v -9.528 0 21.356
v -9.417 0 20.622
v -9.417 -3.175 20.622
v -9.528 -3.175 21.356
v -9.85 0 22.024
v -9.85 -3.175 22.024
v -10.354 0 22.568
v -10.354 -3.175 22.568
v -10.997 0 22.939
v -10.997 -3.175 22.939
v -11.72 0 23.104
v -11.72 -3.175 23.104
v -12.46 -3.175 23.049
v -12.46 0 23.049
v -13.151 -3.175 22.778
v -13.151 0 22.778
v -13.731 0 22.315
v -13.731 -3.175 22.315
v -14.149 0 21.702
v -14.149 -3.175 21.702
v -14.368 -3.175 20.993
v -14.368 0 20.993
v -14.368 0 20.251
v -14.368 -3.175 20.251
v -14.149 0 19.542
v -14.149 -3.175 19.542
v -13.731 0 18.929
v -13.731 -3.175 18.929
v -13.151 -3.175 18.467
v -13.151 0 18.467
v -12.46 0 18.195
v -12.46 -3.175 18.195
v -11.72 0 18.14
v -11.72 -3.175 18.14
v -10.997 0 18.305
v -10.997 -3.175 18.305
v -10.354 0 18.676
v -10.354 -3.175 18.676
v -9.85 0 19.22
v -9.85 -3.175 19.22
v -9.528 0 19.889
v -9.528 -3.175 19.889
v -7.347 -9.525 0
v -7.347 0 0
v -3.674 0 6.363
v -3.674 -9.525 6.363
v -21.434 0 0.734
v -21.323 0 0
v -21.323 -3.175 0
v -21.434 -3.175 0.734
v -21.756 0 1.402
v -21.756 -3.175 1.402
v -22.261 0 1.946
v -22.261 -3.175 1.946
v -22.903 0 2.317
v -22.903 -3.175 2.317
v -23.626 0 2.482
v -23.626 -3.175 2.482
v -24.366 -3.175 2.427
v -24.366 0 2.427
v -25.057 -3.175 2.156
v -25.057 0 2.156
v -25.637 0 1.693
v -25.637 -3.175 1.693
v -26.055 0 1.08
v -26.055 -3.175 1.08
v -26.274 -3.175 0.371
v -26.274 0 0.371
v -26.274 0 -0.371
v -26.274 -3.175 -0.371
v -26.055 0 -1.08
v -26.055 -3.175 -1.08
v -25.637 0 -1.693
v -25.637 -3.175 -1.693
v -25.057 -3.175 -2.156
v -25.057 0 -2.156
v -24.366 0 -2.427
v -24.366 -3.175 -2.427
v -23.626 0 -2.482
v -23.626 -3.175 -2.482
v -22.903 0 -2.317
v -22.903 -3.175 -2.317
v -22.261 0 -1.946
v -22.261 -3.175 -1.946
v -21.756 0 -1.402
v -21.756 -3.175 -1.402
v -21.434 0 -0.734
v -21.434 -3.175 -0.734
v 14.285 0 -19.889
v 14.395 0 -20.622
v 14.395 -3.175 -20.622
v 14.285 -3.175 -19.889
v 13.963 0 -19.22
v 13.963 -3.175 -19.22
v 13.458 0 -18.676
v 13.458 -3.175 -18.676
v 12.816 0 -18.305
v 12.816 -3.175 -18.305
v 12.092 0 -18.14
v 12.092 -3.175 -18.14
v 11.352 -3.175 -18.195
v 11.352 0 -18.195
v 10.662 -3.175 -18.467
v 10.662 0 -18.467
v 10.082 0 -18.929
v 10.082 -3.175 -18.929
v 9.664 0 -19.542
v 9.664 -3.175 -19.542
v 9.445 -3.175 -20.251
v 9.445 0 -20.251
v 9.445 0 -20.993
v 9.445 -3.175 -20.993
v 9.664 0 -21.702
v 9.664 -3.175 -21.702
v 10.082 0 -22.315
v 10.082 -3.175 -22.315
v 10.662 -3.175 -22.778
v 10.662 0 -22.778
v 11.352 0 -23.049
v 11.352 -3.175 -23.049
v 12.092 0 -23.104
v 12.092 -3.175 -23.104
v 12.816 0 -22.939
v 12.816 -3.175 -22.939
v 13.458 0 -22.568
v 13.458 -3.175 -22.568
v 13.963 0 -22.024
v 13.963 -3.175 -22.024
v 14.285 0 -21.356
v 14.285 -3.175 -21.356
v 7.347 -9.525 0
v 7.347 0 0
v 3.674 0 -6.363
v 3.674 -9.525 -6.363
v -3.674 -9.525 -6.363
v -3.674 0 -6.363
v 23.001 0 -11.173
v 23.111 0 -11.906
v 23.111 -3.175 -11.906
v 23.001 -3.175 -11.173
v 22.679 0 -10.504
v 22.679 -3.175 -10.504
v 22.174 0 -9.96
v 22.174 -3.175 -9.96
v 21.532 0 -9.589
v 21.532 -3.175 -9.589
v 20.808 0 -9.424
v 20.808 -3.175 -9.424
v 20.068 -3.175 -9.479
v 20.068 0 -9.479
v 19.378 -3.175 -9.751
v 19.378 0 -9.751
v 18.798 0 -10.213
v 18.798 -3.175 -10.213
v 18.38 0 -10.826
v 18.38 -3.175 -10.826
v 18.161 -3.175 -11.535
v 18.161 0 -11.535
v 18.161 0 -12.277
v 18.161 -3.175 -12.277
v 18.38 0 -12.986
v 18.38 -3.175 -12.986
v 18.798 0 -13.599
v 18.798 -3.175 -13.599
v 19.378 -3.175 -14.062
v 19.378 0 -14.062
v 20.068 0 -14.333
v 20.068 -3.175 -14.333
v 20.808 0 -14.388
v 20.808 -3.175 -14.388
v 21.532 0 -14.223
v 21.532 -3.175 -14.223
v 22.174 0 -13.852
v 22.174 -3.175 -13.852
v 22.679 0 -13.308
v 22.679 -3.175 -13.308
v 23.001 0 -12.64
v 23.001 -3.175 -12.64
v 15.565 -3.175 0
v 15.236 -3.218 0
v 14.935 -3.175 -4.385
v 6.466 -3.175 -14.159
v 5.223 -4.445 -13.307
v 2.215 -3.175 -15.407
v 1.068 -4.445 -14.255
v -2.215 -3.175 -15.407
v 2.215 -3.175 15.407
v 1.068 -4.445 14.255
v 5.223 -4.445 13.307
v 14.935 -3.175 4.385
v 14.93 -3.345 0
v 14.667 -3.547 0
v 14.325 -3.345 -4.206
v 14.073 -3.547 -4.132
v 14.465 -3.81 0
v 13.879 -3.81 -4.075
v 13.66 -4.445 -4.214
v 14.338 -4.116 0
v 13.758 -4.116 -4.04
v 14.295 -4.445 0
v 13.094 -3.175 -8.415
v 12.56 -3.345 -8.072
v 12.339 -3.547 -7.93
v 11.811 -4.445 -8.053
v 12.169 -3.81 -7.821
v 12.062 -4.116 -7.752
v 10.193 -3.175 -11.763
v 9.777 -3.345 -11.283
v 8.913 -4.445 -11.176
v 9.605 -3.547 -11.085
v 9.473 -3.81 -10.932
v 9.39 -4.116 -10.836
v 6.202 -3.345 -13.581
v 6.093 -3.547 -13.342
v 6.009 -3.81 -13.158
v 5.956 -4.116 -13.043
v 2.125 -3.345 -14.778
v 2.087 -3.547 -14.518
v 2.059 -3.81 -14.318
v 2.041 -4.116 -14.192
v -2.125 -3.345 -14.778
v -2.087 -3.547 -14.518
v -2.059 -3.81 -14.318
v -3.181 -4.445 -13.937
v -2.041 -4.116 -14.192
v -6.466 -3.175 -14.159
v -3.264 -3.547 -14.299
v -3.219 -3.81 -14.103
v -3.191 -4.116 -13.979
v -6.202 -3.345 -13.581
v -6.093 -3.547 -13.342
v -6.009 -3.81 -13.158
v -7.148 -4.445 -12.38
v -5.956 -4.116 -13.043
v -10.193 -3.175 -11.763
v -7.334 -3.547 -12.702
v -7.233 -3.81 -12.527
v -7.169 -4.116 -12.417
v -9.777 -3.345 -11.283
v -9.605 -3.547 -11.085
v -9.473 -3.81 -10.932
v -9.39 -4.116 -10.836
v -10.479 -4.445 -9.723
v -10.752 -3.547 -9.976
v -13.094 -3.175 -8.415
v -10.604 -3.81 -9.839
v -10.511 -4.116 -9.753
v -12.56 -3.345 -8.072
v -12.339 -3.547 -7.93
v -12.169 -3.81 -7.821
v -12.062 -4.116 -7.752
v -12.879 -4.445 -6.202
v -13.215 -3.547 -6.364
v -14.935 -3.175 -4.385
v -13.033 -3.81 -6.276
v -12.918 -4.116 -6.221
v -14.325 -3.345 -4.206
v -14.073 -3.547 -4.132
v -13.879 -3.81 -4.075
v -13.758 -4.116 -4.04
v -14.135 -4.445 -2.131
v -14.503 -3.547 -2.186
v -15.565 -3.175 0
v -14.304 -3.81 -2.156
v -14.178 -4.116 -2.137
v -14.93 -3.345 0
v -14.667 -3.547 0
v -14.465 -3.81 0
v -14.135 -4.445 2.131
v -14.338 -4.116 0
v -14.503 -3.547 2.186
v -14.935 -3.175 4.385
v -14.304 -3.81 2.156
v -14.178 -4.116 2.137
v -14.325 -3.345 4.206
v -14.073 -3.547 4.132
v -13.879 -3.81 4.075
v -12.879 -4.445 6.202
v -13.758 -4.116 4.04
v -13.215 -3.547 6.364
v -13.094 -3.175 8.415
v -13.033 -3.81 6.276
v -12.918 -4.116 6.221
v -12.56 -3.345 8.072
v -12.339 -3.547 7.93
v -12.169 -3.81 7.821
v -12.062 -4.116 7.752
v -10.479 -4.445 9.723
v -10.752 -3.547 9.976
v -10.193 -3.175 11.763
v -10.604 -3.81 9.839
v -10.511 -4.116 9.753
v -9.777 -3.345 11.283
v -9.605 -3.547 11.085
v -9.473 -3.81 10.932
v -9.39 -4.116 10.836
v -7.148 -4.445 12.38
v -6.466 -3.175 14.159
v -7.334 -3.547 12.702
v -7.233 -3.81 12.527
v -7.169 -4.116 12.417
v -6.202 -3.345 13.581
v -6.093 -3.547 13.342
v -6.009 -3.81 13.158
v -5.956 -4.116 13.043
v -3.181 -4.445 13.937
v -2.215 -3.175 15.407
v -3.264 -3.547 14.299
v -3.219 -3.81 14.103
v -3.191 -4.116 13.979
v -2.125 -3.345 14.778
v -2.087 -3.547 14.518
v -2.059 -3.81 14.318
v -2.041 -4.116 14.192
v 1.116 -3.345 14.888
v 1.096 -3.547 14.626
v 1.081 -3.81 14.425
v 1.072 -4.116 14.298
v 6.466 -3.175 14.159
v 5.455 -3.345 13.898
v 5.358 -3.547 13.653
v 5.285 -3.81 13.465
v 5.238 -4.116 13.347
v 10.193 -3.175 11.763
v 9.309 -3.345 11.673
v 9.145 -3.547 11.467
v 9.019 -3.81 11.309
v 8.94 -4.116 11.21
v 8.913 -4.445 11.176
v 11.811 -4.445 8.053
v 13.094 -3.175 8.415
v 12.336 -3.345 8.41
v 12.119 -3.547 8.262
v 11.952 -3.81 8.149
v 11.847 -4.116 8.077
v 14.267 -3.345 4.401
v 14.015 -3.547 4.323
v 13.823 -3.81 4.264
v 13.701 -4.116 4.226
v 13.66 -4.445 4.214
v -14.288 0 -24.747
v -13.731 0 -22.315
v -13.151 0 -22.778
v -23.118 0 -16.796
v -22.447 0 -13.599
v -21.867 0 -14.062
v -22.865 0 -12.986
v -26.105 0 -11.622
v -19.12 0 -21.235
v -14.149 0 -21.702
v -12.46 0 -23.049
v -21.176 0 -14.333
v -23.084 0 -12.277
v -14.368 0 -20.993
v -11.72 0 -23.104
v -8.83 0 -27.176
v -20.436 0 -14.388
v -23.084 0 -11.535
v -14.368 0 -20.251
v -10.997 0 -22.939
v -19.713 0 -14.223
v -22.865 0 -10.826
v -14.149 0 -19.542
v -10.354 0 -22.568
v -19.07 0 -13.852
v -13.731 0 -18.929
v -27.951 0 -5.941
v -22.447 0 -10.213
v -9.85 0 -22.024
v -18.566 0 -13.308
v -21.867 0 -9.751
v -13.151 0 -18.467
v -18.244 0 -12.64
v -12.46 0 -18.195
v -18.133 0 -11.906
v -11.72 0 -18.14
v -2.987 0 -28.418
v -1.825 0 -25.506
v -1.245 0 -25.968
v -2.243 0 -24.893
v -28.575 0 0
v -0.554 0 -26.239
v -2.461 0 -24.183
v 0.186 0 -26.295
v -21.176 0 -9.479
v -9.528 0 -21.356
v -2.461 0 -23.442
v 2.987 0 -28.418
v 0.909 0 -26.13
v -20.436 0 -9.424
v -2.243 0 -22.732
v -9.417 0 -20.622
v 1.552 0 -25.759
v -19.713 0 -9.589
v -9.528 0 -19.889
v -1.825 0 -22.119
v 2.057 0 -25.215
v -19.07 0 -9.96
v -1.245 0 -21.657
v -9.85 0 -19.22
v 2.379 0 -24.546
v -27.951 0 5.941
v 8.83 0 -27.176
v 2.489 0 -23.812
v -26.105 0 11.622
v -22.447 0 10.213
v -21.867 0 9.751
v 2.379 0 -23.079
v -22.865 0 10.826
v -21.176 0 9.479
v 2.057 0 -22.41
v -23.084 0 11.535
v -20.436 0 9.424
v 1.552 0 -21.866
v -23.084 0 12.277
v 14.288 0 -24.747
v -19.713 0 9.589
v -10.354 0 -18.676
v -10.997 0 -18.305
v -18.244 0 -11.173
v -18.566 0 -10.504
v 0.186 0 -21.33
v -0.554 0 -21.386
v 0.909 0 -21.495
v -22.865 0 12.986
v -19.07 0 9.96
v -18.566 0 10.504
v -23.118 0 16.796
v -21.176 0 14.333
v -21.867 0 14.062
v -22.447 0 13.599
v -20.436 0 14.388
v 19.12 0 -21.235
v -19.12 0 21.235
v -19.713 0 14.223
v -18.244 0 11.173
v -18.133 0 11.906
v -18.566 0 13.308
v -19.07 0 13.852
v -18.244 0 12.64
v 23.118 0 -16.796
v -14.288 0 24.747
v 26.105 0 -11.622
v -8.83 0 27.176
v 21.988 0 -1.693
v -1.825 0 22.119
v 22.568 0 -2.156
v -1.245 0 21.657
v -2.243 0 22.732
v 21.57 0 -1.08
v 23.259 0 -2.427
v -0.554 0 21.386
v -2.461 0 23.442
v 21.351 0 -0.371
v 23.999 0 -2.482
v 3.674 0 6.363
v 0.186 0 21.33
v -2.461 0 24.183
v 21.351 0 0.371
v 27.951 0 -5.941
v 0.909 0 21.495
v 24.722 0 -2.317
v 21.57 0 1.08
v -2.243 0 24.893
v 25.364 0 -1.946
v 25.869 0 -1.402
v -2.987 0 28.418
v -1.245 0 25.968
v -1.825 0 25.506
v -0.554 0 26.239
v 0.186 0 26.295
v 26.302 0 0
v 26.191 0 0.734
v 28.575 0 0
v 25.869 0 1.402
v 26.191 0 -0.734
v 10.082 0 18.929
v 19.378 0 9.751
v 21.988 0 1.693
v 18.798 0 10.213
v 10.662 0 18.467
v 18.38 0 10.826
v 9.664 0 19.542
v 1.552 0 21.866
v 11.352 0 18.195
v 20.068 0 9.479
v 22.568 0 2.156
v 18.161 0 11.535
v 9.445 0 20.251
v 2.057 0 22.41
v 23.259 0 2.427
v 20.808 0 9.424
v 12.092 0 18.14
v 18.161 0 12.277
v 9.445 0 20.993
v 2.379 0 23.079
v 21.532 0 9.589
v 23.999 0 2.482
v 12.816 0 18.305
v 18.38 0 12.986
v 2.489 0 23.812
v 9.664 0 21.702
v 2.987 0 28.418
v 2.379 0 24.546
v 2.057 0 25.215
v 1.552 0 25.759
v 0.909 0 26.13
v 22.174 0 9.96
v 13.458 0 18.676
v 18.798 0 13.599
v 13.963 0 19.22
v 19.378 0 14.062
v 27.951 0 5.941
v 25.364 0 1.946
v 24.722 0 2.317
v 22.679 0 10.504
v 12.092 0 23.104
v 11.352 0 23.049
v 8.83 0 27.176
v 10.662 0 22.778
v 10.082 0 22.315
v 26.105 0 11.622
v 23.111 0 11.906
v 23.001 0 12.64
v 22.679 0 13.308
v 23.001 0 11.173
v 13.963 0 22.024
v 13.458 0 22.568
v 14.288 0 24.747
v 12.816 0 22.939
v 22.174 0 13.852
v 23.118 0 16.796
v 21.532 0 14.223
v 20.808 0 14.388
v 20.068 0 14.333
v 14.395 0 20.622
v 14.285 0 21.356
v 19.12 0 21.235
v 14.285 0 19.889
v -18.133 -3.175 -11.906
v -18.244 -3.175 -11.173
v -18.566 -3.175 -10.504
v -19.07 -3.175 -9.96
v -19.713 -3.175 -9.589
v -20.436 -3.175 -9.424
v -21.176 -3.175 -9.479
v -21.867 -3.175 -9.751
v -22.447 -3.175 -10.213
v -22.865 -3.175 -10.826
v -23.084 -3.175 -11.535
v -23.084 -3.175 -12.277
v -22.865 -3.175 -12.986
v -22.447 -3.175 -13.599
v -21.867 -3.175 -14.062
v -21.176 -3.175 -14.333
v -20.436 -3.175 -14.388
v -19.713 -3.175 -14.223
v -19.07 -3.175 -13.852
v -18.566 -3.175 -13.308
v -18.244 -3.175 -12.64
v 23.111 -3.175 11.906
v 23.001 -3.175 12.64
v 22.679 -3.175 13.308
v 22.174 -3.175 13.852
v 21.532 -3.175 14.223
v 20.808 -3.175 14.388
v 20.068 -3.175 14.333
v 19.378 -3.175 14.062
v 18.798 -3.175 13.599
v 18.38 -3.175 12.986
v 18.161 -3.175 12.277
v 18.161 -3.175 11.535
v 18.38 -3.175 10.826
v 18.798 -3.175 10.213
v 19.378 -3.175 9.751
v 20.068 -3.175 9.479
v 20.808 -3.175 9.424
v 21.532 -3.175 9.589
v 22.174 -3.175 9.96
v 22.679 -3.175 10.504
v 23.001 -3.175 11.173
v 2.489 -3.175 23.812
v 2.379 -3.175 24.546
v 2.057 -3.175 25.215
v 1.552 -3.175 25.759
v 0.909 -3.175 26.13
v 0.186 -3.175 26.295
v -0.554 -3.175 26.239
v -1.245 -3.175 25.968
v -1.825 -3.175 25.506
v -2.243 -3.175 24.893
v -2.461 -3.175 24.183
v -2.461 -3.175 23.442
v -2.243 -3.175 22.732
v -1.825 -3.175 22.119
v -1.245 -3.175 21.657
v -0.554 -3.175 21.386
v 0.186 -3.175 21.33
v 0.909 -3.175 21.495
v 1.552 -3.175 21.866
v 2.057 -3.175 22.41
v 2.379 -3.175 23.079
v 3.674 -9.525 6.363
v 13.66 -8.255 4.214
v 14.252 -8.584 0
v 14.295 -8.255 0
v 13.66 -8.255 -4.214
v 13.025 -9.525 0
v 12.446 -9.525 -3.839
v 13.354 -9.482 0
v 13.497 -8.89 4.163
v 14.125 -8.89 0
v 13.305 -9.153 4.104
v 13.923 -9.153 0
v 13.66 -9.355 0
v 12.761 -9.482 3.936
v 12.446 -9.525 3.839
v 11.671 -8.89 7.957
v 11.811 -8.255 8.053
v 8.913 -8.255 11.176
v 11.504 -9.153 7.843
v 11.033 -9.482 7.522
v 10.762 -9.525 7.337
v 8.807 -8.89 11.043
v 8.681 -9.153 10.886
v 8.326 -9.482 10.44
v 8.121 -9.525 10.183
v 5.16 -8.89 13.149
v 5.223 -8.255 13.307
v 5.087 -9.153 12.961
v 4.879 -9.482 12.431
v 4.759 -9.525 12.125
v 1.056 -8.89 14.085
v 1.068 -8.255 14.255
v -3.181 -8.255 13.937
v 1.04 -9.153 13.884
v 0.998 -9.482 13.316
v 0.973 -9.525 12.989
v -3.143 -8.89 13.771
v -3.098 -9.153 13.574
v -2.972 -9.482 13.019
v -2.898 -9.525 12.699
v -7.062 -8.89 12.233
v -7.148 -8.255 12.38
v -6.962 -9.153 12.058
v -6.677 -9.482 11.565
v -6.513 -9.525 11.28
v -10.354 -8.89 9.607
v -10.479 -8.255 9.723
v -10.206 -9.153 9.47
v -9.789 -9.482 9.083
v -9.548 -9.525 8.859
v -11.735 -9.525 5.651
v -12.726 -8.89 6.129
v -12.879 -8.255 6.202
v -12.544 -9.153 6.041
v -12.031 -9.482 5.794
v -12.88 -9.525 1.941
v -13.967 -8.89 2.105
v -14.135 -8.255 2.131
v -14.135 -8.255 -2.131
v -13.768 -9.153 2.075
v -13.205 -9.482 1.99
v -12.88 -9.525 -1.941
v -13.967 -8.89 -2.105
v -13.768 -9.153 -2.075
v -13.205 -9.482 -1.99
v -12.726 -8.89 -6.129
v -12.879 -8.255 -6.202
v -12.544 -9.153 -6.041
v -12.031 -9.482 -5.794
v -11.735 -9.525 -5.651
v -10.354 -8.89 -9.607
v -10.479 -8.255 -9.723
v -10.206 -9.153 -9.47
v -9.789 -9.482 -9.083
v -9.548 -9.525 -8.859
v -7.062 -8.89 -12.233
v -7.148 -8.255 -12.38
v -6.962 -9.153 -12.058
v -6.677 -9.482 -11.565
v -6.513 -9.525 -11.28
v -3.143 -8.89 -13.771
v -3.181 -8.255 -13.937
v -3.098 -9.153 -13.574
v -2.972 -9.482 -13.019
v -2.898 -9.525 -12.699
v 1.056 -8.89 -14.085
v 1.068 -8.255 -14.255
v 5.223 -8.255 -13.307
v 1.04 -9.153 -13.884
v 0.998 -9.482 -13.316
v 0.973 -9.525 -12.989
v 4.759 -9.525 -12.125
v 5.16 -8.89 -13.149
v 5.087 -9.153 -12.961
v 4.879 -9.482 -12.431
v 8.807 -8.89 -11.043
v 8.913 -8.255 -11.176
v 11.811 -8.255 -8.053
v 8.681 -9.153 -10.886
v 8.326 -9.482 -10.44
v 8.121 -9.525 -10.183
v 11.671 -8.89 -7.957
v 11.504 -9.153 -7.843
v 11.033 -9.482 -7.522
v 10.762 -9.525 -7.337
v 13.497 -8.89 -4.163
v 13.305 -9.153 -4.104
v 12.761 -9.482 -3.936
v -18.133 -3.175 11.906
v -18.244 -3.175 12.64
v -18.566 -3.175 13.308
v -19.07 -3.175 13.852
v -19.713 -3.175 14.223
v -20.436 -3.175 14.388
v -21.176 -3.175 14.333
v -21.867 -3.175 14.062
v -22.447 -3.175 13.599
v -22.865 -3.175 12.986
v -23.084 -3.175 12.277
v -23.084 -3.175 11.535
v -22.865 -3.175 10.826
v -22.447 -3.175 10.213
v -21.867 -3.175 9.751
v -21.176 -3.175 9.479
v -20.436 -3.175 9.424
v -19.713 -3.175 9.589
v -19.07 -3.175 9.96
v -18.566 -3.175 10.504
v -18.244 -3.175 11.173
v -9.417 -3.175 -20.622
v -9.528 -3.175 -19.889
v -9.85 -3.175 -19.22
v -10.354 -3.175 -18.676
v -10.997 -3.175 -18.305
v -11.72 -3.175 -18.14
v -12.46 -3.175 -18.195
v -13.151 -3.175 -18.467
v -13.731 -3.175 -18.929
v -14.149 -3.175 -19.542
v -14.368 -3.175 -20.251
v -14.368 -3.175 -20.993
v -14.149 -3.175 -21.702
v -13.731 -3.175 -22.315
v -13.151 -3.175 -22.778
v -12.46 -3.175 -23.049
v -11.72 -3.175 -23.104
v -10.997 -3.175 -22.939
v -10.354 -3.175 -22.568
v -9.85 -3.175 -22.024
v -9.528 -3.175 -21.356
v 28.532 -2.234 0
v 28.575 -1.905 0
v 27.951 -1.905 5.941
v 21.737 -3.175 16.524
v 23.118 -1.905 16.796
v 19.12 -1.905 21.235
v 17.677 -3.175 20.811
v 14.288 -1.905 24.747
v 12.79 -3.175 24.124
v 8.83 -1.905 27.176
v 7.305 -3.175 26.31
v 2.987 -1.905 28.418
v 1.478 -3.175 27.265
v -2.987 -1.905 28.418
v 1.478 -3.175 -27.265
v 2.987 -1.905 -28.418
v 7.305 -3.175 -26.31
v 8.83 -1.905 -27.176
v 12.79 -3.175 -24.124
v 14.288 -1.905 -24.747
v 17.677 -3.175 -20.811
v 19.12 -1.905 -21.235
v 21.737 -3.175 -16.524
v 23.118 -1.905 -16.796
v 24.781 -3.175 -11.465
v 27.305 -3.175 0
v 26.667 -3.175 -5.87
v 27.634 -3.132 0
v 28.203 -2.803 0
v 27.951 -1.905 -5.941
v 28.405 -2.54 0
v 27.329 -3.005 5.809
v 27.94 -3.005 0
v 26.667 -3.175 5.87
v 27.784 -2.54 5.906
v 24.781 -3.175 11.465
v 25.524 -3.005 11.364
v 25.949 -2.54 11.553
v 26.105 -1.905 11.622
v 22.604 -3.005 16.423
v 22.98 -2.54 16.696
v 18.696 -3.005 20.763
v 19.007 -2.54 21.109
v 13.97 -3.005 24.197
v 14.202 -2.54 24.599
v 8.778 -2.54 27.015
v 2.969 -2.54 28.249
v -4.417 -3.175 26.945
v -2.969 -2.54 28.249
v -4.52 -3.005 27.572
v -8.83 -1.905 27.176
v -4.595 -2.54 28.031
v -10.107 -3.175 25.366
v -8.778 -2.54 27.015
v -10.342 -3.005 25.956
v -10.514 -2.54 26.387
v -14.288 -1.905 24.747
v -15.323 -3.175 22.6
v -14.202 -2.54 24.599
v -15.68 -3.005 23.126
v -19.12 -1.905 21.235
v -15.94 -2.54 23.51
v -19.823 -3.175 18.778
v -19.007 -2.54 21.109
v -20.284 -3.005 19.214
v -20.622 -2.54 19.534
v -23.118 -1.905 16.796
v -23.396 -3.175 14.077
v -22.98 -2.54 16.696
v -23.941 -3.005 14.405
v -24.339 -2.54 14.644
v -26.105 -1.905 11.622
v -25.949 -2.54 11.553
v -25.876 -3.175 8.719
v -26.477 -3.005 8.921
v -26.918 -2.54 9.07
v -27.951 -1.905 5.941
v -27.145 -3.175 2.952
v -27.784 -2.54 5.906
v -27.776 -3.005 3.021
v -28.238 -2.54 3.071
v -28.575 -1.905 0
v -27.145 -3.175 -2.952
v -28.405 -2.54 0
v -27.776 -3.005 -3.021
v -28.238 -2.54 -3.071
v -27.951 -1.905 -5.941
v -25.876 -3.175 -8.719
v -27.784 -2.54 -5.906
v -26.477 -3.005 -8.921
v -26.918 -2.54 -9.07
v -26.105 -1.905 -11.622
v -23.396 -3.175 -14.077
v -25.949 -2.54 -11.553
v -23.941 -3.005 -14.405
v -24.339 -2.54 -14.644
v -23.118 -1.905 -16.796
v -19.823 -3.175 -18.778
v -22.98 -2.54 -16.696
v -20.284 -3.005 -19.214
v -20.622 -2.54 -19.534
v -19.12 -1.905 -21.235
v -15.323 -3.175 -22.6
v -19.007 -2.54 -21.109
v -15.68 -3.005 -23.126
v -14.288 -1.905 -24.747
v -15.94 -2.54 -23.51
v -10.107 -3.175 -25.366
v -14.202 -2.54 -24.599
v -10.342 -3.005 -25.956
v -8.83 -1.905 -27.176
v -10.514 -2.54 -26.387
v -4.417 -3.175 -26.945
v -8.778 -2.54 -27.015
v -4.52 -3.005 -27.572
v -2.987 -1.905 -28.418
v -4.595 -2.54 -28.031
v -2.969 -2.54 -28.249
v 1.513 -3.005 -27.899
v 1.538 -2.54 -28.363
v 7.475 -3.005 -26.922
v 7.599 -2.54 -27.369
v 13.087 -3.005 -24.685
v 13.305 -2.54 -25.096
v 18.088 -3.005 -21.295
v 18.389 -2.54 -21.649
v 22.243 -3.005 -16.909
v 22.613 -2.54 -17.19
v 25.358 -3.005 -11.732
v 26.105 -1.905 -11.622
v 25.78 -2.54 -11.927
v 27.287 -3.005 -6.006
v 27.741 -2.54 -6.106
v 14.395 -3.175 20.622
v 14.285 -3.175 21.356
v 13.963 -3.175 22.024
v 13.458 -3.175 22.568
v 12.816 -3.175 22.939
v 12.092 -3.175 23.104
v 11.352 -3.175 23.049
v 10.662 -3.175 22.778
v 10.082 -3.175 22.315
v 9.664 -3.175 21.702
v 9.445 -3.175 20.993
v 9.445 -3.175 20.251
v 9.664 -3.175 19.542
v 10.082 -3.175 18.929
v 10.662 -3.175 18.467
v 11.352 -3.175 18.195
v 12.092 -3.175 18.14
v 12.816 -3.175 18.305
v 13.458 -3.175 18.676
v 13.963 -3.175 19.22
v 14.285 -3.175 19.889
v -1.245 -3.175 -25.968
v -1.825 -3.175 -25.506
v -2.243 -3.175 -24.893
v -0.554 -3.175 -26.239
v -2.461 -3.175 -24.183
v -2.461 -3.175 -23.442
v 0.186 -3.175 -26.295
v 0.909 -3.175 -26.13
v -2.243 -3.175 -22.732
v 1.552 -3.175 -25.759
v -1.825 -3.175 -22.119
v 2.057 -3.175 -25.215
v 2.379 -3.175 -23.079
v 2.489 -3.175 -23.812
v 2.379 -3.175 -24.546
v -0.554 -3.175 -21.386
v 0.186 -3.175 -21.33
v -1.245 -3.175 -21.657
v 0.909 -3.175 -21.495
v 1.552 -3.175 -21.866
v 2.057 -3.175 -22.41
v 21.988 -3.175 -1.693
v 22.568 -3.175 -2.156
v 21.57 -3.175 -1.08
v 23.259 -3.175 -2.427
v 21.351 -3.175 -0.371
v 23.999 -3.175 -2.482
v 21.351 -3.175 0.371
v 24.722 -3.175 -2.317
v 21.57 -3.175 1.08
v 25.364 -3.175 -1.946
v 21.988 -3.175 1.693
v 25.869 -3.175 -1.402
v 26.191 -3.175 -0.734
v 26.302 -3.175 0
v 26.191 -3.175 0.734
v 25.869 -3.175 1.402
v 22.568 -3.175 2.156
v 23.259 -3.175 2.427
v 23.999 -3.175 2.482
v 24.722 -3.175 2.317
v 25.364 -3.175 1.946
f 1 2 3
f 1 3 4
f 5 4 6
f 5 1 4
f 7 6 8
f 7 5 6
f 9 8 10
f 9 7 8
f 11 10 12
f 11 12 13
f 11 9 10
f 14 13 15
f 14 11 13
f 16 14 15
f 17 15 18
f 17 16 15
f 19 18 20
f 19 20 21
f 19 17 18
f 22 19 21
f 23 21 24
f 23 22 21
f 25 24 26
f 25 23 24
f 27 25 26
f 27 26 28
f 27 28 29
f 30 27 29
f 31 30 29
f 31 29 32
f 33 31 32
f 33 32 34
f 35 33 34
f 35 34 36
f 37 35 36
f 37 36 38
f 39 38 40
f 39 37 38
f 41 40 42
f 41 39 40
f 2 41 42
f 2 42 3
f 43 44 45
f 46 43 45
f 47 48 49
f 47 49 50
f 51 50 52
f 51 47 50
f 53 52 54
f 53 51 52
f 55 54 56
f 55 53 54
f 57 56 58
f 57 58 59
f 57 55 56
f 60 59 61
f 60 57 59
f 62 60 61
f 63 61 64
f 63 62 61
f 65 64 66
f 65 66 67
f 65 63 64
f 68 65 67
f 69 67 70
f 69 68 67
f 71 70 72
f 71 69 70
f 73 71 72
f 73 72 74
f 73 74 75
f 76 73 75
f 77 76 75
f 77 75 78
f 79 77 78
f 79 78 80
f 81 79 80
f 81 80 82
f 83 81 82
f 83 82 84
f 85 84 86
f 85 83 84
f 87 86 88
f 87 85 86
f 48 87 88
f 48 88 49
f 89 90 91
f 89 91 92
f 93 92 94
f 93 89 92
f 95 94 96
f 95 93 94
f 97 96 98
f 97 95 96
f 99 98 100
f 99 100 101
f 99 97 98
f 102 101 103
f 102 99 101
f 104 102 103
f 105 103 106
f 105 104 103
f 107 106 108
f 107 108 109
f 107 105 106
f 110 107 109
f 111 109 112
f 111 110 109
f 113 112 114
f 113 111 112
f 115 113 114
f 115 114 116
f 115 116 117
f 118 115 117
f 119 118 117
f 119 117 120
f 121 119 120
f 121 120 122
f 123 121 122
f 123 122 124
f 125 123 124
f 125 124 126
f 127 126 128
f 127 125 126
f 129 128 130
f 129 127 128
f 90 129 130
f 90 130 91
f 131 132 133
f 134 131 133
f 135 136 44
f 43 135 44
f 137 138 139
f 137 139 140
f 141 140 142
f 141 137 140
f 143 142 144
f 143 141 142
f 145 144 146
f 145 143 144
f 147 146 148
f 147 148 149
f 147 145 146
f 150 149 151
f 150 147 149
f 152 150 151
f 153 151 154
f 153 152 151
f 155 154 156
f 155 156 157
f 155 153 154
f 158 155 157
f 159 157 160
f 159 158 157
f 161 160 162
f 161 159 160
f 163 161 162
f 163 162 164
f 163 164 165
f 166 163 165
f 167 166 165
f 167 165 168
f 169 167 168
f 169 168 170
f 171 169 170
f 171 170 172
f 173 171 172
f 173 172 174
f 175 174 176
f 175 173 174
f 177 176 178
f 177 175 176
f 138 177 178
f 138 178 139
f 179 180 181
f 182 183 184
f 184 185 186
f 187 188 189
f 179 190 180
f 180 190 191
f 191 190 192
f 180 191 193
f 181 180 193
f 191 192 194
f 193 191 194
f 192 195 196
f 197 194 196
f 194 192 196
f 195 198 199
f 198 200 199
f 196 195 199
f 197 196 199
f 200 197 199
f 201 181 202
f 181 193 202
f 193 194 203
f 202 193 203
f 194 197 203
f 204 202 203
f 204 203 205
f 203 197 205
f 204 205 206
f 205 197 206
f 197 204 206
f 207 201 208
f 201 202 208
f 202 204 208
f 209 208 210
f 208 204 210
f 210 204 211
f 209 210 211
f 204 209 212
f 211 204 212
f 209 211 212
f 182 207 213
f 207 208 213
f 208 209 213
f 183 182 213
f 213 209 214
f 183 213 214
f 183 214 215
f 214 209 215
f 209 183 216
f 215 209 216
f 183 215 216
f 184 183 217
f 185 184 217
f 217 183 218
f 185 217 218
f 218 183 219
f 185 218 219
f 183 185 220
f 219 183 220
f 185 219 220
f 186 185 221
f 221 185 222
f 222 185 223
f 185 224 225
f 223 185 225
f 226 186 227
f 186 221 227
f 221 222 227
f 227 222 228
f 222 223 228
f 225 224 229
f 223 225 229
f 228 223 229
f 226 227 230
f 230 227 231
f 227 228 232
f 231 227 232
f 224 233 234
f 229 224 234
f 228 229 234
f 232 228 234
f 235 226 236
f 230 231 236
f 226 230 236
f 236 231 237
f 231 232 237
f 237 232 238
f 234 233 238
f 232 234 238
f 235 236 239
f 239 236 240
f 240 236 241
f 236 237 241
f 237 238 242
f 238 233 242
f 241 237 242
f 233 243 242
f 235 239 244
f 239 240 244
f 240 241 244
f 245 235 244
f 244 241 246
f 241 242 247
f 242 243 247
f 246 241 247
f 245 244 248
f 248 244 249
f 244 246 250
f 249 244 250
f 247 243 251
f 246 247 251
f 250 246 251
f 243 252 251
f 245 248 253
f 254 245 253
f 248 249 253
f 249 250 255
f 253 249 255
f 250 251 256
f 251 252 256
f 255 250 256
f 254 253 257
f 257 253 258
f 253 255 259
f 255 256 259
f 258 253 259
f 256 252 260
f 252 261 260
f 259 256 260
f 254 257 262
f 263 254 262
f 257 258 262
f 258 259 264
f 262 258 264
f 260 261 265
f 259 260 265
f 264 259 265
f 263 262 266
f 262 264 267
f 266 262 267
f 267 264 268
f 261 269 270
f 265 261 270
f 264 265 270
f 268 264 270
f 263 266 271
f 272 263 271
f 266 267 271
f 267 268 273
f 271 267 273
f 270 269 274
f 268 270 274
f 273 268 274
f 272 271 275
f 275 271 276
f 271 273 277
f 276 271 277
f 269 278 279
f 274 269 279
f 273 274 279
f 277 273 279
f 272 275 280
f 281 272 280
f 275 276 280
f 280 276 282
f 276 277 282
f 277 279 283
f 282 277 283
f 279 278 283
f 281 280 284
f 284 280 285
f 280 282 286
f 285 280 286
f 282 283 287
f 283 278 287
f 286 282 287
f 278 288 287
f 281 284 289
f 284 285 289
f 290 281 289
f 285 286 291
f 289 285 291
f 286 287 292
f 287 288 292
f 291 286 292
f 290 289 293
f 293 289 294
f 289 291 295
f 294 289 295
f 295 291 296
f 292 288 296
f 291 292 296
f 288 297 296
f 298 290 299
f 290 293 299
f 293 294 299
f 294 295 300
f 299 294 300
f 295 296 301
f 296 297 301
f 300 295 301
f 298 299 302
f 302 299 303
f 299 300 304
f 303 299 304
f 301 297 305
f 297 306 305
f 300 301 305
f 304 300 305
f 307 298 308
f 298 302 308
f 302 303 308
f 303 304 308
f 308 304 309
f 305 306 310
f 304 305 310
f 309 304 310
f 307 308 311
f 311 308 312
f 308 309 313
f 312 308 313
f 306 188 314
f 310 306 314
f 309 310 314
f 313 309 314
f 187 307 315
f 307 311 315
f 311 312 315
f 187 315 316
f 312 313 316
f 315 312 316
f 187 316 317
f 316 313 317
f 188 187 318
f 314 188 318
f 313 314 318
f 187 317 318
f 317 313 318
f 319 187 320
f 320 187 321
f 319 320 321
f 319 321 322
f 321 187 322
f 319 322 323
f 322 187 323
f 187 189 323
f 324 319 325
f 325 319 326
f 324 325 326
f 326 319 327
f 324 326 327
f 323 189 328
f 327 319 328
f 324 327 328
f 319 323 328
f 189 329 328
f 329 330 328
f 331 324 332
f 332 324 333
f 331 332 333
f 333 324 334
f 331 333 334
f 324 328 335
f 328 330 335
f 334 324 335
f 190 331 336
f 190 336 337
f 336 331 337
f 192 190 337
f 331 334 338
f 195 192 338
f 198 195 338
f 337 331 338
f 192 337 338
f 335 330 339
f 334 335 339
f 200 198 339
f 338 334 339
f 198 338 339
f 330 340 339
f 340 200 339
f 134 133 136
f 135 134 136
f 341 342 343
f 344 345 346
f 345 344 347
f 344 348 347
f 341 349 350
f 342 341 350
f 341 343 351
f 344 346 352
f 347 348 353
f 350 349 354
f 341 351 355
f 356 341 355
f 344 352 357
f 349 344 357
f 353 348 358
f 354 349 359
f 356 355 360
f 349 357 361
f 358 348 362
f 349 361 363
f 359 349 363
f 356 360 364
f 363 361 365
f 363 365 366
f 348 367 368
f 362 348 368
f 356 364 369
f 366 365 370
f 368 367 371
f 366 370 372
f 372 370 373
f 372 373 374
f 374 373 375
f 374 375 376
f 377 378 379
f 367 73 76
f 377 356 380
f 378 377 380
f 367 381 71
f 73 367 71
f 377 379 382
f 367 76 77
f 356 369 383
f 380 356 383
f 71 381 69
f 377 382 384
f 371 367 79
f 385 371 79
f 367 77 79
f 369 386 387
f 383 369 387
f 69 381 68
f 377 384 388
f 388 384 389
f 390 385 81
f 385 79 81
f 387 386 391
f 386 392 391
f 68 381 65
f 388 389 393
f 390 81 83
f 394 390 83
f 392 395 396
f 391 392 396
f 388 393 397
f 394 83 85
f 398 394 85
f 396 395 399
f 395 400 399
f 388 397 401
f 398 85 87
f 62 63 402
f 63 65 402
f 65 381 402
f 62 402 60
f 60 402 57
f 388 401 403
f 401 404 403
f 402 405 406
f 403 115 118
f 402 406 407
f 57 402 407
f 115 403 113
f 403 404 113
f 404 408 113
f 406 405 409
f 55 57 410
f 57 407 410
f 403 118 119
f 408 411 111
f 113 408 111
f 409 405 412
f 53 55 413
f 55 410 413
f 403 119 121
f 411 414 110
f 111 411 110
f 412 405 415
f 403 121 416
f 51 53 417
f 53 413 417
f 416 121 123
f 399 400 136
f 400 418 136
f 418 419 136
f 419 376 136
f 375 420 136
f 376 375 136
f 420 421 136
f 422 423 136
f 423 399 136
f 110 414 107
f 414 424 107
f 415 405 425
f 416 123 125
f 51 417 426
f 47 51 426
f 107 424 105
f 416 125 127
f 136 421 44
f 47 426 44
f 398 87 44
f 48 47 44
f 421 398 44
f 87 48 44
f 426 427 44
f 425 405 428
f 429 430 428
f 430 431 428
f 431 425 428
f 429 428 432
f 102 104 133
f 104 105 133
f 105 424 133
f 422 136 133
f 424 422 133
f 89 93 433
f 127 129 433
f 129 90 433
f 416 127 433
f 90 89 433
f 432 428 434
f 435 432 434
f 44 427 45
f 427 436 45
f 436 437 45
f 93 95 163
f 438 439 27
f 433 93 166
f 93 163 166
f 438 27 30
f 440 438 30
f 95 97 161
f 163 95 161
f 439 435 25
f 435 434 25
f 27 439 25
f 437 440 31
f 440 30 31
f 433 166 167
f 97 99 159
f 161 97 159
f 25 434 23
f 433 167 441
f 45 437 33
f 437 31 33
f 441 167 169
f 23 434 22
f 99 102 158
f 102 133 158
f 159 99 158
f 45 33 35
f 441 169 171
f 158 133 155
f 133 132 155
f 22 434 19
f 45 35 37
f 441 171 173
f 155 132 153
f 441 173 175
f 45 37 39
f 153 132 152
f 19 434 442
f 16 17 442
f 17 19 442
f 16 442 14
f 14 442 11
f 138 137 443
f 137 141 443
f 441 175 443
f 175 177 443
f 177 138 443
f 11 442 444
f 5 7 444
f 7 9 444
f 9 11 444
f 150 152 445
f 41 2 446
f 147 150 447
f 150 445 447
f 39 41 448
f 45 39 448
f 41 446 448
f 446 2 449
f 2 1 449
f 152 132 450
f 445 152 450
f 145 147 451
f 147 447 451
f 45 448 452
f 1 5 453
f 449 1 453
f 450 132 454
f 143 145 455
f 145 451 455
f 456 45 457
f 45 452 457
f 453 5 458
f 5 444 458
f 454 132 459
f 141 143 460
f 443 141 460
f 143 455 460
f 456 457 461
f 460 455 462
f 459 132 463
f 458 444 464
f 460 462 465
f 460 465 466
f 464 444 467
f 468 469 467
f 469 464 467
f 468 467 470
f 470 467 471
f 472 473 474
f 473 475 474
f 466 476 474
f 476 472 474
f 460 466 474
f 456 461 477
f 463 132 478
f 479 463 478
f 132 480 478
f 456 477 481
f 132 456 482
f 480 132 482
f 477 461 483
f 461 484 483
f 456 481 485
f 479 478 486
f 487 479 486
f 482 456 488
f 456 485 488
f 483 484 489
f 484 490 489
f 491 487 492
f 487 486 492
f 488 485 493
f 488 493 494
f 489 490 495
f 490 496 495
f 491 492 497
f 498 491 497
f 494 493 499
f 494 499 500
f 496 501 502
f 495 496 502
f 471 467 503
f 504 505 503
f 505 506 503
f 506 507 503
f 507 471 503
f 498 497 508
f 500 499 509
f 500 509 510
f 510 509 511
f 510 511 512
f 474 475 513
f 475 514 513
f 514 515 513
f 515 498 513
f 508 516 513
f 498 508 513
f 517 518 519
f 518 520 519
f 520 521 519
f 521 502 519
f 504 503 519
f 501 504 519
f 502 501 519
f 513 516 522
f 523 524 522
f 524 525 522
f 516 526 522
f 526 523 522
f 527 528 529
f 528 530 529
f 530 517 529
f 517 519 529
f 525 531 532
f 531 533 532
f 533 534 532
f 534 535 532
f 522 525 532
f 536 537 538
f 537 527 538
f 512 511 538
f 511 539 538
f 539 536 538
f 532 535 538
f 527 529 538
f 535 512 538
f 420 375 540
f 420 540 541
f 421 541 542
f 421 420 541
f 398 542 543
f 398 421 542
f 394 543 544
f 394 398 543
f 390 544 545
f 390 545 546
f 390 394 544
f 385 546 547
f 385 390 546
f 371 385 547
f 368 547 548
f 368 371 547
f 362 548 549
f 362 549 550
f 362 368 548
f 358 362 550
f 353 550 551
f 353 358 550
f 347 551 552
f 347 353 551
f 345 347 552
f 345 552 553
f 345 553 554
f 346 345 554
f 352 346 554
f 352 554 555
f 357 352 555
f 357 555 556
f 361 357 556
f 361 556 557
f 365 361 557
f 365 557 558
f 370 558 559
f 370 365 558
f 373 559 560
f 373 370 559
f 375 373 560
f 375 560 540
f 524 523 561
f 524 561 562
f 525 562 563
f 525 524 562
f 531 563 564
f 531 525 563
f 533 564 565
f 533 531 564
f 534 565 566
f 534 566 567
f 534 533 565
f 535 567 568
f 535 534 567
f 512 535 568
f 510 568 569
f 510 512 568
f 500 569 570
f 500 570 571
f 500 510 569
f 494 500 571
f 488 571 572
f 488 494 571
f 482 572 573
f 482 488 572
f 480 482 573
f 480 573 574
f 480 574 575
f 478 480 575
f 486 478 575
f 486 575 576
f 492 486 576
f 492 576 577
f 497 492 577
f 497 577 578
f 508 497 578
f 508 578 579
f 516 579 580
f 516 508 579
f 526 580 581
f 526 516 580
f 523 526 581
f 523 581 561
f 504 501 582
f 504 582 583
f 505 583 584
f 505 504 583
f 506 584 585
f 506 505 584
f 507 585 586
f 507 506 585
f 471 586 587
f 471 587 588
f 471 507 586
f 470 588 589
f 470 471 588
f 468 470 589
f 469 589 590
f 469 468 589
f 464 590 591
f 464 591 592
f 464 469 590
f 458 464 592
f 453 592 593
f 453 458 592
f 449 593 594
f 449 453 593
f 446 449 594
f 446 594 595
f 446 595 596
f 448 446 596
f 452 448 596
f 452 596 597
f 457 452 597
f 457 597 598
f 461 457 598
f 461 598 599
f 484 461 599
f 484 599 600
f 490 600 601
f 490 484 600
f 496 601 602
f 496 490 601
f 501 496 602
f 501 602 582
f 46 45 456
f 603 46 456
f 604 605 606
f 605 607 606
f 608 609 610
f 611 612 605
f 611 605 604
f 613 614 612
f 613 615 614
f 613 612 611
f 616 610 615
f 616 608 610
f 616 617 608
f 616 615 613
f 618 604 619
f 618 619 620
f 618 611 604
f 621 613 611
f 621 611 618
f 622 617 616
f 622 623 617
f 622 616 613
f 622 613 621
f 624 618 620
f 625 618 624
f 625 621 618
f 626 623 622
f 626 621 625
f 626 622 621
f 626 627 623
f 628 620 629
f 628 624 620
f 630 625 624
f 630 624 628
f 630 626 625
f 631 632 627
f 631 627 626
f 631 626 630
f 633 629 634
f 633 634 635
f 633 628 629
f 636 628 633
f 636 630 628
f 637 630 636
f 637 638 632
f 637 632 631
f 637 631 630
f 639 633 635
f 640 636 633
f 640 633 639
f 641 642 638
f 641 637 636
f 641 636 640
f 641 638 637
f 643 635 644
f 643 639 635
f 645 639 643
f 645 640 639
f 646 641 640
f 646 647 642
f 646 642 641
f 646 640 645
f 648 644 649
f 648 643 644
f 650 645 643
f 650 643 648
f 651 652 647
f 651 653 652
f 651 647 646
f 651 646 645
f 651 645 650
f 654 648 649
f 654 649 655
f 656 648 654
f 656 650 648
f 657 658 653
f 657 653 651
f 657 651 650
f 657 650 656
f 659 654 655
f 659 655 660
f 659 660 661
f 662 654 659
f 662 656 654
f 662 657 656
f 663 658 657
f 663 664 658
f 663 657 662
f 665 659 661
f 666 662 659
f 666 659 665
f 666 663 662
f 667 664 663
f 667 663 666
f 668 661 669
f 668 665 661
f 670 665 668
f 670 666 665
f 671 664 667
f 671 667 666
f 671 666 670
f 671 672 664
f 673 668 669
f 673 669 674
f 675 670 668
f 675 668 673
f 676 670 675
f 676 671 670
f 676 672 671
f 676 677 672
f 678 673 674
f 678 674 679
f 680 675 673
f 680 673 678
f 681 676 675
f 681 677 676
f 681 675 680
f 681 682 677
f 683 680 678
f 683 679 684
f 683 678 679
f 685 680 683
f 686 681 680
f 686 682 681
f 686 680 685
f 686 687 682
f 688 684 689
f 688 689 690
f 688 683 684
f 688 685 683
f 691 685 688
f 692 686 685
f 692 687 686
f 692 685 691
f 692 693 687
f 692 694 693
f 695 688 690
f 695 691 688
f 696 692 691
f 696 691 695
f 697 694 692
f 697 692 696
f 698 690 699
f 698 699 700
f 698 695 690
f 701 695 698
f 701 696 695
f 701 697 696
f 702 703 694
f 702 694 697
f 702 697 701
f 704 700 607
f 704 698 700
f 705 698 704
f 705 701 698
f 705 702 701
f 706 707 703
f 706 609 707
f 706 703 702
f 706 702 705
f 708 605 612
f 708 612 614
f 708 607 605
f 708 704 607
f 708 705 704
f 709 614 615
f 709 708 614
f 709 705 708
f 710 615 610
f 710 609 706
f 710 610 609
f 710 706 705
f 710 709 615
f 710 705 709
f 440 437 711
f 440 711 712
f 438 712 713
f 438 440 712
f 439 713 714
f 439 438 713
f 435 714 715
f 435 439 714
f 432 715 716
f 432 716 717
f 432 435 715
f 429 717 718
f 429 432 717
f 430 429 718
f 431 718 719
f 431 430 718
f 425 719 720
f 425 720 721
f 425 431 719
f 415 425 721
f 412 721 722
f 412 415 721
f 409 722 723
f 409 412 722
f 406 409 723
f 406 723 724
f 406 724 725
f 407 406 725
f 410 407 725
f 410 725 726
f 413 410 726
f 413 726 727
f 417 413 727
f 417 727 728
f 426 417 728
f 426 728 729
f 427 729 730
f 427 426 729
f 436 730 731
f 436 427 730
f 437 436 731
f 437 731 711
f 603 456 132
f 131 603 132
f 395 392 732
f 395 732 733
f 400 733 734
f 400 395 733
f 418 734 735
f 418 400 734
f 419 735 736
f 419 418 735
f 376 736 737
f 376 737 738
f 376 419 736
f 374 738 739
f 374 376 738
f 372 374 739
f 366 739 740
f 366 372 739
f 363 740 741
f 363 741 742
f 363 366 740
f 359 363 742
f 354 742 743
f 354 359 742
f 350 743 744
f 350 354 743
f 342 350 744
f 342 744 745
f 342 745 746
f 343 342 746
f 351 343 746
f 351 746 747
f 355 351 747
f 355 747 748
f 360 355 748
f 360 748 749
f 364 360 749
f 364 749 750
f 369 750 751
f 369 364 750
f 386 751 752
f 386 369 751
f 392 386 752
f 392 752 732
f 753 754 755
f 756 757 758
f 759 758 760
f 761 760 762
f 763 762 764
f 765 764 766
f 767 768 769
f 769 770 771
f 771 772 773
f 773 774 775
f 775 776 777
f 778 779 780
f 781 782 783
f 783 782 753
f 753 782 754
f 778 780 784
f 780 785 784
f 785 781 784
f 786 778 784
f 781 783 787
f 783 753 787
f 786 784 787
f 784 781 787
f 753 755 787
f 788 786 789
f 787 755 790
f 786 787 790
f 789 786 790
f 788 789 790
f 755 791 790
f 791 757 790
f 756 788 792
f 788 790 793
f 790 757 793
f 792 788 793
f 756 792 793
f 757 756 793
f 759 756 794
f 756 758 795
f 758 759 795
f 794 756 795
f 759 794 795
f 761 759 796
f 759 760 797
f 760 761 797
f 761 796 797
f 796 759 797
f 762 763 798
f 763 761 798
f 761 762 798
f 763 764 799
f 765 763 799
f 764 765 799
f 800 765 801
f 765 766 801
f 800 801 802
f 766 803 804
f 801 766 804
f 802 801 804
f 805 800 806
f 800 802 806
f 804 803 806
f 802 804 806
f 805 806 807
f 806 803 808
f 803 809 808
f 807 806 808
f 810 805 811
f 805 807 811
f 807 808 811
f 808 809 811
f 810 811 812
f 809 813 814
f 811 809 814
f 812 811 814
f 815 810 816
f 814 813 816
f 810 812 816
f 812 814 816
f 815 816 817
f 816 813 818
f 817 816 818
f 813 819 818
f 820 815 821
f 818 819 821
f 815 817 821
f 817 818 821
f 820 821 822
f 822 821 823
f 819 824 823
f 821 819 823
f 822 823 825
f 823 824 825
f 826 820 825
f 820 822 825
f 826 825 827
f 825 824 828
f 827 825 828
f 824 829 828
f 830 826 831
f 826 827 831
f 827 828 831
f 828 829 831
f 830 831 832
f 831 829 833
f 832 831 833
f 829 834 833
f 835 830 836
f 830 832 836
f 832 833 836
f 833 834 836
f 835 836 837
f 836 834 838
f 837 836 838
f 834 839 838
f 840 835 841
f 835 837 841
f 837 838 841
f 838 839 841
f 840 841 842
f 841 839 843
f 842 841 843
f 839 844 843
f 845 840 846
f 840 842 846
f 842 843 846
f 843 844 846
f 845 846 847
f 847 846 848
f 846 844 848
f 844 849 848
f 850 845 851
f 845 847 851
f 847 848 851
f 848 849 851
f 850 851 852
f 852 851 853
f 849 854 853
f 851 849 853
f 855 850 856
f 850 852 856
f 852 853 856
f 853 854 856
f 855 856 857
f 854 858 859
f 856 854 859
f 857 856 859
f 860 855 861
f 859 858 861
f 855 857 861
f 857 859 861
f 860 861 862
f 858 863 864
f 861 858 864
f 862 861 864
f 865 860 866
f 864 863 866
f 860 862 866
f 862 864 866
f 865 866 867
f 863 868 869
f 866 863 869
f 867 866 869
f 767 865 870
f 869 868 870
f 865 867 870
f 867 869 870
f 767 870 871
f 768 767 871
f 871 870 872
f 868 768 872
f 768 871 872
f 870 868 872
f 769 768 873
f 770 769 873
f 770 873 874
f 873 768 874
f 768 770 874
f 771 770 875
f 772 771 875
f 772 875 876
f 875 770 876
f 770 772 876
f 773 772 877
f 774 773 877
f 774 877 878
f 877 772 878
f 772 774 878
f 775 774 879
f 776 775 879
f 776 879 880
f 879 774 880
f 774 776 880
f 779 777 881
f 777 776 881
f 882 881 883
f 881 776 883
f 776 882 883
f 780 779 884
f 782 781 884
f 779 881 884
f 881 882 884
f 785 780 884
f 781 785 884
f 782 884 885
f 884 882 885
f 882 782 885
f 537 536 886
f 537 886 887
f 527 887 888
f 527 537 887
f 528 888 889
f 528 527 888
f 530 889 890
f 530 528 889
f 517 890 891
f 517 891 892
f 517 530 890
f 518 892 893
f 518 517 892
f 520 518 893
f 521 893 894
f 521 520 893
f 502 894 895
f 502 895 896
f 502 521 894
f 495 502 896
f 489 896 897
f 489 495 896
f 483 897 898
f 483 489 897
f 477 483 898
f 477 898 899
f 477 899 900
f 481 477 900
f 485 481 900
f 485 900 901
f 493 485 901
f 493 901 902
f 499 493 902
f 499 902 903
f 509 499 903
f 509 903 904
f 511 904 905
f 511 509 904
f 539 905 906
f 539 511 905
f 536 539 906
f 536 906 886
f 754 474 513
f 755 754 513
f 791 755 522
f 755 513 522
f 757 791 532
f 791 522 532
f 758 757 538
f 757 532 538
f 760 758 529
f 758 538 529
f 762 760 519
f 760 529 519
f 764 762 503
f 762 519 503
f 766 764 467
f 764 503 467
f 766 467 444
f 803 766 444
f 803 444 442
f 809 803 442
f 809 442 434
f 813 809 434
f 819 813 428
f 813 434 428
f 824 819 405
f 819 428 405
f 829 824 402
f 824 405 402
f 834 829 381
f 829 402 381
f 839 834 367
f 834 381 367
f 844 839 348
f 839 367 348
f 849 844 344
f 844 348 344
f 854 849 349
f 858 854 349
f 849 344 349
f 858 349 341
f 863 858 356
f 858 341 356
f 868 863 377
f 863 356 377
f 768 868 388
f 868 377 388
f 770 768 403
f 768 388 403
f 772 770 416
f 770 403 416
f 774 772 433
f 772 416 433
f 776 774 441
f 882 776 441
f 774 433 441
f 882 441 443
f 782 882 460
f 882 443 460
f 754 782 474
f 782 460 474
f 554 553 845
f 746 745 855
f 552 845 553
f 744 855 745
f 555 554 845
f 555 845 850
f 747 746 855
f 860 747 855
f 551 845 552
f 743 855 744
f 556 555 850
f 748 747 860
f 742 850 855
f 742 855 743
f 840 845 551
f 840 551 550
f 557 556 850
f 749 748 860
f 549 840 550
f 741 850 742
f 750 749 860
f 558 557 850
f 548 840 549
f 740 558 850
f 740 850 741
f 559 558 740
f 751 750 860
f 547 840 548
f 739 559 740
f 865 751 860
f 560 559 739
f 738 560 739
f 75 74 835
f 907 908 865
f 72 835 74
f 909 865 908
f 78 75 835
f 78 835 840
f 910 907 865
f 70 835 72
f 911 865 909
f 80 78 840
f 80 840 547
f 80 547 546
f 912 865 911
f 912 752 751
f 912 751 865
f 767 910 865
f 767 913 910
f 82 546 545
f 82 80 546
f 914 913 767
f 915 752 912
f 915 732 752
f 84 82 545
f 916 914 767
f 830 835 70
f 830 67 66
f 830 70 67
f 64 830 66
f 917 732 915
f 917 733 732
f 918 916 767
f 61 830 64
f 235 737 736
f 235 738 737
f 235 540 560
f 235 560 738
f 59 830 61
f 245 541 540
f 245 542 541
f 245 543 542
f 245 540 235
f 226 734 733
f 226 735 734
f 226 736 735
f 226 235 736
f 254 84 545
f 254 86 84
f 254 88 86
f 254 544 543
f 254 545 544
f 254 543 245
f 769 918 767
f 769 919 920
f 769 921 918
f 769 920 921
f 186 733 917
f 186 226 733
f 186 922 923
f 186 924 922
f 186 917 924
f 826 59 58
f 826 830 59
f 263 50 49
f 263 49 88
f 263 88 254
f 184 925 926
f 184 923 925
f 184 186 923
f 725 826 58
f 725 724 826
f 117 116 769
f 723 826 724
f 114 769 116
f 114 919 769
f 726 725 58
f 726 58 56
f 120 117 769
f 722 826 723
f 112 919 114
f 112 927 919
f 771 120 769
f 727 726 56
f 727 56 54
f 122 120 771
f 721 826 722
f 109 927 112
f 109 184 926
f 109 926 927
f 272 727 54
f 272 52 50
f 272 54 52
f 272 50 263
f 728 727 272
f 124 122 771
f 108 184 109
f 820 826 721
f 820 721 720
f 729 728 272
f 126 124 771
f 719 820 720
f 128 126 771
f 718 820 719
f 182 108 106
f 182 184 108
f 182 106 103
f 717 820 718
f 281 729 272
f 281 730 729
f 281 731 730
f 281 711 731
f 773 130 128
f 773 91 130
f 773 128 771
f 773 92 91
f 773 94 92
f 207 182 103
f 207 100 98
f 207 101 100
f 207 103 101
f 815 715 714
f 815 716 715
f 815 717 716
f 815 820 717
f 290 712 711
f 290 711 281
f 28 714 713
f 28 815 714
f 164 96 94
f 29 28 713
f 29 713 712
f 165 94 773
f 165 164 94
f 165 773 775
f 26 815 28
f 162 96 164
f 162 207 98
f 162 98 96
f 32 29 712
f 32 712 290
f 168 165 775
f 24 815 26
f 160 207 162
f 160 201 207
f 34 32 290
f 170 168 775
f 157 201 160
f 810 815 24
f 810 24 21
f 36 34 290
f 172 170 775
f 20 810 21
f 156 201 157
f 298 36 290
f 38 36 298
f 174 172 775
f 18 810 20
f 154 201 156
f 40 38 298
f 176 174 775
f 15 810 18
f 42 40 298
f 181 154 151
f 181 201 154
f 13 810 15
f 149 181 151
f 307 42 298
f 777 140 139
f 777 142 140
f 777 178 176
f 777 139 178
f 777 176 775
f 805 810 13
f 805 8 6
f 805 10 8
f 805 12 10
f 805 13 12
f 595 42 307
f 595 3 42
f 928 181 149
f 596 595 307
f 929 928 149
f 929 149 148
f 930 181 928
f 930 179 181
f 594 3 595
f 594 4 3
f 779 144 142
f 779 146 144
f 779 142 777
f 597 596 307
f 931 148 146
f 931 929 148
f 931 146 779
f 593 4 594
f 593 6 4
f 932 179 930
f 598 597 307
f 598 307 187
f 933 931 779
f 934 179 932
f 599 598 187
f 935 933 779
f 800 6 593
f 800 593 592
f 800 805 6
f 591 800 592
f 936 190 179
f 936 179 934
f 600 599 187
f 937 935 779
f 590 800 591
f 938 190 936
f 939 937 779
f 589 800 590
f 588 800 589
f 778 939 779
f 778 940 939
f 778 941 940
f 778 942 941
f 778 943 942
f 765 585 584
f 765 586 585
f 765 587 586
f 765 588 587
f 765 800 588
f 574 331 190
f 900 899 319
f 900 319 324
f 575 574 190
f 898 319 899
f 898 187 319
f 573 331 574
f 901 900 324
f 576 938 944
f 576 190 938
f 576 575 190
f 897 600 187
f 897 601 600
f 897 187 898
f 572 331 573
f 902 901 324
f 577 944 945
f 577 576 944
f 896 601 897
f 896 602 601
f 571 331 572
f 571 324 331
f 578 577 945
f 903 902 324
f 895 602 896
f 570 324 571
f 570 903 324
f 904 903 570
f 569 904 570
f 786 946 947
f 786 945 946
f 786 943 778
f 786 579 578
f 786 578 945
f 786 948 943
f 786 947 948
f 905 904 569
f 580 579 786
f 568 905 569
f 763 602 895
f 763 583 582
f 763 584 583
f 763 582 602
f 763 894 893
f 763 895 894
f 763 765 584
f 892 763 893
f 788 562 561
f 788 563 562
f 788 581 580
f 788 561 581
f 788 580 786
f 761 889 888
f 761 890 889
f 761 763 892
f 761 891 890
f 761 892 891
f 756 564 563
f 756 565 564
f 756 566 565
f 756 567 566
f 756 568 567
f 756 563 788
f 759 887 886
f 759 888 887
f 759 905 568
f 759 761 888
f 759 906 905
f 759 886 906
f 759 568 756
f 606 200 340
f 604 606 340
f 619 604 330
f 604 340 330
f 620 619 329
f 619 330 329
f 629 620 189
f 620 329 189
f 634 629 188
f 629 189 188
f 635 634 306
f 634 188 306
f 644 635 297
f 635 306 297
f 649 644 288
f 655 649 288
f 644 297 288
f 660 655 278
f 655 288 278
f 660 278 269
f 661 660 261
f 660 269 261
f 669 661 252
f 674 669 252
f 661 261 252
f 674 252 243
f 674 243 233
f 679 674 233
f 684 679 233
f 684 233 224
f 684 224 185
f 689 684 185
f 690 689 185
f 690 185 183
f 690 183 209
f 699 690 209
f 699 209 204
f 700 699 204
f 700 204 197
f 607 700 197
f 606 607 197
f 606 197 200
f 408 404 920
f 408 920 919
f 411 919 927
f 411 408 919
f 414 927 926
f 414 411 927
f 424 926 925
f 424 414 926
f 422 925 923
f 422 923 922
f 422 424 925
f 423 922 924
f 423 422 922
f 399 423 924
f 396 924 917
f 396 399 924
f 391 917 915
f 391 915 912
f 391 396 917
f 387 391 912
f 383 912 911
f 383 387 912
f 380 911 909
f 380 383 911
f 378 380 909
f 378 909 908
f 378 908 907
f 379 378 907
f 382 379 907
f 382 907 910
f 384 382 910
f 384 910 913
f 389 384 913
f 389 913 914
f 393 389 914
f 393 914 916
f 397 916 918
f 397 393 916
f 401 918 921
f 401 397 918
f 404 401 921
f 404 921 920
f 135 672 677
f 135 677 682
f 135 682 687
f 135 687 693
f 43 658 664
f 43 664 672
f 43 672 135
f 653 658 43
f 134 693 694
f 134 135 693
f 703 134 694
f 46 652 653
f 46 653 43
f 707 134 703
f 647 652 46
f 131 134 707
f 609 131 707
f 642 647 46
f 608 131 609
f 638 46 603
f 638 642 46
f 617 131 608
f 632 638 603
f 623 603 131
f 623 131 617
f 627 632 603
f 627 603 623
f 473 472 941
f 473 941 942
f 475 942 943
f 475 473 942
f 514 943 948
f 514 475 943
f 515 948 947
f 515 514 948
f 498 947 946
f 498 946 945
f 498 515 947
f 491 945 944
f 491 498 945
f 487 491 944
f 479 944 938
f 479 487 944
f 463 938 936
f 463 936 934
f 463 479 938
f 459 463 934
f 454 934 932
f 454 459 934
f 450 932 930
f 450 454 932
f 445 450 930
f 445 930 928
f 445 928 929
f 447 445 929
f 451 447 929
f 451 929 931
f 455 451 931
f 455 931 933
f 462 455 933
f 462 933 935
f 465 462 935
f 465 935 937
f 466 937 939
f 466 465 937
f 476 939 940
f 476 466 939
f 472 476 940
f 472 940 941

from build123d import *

# Parameters (mm, degrees)
F0_R     = 28.575
F0_R_2   = 2.4892
F0_R_3   = 14.29512
F1_DEPTH = 3.175
F2_DEPTH = 9.525
F3_R     = 1.27


with BuildPart() as f1:
    # F0 (on Front) → F1 (new body)
    with BuildSketch(Plane.XZ):
        Circle(F0_R)
        with Locations((-11.90625, -20.62223)):
            Circle(F0_R_2, mode=Mode.SUBTRACT)
        with Locations((-20.62223, -11.90625)):
            Circle(F0_R_2, mode=Mode.SUBTRACT)
        with Locations((0, -23.8125)):
            Circle(F0_R_2, mode=Mode.SUBTRACT)
        with Locations((11.90625, -20.62223)):
            Circle(F0_R_2, mode=Mode.SUBTRACT)
        with Locations((20.62223, -11.90625)):
            Circle(F0_R_2, mode=Mode.SUBTRACT)
        with Locations((-23.8125, 0)):
            Circle(F0_R_2, mode=Mode.SUBTRACT)
        with Locations((-20.62223, 11.90625)):
            Circle(F0_R_2, mode=Mode.SUBTRACT)
        with Locations((-11.90625, 20.62223)):
            Circle(F0_R_2, mode=Mode.SUBTRACT)
        Circle(F0_R_3, mode=Mode.SUBTRACT)
        with Locations((23.8125, 0)):
            Circle(F0_R_2, mode=Mode.SUBTRACT)
        with Locations((20.62223, 11.90625)):
            Circle(F0_R_2, mode=Mode.SUBTRACT)
        with Locations((11.90625, 20.62223)):
            Circle(F0_R_2, mode=Mode.SUBTRACT)
        with Locations((0, 23.8125)):
            Circle(F0_R_2, mode=Mode.SUBTRACT)
        Circle(F0_R_3)
        Polygon((-7.347013, 0), (-3.673507, 6.3627), (3.673507, 6.3627), (7.347013, 0), (3.673507, -6.3627), (-3.673507, -6.3627), align=None, mode=Mode.SUBTRACT)
    extrude(amount=F1_DEPTH)

    # F0 (on Front) → F2 (join)
    with BuildSketch(Plane.XZ):
        Circle(F0_R_3)
        Polygon((-7.347013, 0), (-3.673507, 6.3627), (3.673507, 6.3627), (7.347013, 0), (3.673507, -6.3627), (-3.673507, -6.3627), align=None, mode=Mode.SUBTRACT)
    extrude(amount=F2_DEPTH)

    # F3
    f3_edges = [f1.edges().sort_by_distance(p)[0] for p in [
        (-28.575, -3.175, 0),
        (-14.29512, -9.525, 0),
        (-14.29512, -3.175, 0),
    ]]
    fillet(f3_edges, radius=F3_R)


solid = f1.part
